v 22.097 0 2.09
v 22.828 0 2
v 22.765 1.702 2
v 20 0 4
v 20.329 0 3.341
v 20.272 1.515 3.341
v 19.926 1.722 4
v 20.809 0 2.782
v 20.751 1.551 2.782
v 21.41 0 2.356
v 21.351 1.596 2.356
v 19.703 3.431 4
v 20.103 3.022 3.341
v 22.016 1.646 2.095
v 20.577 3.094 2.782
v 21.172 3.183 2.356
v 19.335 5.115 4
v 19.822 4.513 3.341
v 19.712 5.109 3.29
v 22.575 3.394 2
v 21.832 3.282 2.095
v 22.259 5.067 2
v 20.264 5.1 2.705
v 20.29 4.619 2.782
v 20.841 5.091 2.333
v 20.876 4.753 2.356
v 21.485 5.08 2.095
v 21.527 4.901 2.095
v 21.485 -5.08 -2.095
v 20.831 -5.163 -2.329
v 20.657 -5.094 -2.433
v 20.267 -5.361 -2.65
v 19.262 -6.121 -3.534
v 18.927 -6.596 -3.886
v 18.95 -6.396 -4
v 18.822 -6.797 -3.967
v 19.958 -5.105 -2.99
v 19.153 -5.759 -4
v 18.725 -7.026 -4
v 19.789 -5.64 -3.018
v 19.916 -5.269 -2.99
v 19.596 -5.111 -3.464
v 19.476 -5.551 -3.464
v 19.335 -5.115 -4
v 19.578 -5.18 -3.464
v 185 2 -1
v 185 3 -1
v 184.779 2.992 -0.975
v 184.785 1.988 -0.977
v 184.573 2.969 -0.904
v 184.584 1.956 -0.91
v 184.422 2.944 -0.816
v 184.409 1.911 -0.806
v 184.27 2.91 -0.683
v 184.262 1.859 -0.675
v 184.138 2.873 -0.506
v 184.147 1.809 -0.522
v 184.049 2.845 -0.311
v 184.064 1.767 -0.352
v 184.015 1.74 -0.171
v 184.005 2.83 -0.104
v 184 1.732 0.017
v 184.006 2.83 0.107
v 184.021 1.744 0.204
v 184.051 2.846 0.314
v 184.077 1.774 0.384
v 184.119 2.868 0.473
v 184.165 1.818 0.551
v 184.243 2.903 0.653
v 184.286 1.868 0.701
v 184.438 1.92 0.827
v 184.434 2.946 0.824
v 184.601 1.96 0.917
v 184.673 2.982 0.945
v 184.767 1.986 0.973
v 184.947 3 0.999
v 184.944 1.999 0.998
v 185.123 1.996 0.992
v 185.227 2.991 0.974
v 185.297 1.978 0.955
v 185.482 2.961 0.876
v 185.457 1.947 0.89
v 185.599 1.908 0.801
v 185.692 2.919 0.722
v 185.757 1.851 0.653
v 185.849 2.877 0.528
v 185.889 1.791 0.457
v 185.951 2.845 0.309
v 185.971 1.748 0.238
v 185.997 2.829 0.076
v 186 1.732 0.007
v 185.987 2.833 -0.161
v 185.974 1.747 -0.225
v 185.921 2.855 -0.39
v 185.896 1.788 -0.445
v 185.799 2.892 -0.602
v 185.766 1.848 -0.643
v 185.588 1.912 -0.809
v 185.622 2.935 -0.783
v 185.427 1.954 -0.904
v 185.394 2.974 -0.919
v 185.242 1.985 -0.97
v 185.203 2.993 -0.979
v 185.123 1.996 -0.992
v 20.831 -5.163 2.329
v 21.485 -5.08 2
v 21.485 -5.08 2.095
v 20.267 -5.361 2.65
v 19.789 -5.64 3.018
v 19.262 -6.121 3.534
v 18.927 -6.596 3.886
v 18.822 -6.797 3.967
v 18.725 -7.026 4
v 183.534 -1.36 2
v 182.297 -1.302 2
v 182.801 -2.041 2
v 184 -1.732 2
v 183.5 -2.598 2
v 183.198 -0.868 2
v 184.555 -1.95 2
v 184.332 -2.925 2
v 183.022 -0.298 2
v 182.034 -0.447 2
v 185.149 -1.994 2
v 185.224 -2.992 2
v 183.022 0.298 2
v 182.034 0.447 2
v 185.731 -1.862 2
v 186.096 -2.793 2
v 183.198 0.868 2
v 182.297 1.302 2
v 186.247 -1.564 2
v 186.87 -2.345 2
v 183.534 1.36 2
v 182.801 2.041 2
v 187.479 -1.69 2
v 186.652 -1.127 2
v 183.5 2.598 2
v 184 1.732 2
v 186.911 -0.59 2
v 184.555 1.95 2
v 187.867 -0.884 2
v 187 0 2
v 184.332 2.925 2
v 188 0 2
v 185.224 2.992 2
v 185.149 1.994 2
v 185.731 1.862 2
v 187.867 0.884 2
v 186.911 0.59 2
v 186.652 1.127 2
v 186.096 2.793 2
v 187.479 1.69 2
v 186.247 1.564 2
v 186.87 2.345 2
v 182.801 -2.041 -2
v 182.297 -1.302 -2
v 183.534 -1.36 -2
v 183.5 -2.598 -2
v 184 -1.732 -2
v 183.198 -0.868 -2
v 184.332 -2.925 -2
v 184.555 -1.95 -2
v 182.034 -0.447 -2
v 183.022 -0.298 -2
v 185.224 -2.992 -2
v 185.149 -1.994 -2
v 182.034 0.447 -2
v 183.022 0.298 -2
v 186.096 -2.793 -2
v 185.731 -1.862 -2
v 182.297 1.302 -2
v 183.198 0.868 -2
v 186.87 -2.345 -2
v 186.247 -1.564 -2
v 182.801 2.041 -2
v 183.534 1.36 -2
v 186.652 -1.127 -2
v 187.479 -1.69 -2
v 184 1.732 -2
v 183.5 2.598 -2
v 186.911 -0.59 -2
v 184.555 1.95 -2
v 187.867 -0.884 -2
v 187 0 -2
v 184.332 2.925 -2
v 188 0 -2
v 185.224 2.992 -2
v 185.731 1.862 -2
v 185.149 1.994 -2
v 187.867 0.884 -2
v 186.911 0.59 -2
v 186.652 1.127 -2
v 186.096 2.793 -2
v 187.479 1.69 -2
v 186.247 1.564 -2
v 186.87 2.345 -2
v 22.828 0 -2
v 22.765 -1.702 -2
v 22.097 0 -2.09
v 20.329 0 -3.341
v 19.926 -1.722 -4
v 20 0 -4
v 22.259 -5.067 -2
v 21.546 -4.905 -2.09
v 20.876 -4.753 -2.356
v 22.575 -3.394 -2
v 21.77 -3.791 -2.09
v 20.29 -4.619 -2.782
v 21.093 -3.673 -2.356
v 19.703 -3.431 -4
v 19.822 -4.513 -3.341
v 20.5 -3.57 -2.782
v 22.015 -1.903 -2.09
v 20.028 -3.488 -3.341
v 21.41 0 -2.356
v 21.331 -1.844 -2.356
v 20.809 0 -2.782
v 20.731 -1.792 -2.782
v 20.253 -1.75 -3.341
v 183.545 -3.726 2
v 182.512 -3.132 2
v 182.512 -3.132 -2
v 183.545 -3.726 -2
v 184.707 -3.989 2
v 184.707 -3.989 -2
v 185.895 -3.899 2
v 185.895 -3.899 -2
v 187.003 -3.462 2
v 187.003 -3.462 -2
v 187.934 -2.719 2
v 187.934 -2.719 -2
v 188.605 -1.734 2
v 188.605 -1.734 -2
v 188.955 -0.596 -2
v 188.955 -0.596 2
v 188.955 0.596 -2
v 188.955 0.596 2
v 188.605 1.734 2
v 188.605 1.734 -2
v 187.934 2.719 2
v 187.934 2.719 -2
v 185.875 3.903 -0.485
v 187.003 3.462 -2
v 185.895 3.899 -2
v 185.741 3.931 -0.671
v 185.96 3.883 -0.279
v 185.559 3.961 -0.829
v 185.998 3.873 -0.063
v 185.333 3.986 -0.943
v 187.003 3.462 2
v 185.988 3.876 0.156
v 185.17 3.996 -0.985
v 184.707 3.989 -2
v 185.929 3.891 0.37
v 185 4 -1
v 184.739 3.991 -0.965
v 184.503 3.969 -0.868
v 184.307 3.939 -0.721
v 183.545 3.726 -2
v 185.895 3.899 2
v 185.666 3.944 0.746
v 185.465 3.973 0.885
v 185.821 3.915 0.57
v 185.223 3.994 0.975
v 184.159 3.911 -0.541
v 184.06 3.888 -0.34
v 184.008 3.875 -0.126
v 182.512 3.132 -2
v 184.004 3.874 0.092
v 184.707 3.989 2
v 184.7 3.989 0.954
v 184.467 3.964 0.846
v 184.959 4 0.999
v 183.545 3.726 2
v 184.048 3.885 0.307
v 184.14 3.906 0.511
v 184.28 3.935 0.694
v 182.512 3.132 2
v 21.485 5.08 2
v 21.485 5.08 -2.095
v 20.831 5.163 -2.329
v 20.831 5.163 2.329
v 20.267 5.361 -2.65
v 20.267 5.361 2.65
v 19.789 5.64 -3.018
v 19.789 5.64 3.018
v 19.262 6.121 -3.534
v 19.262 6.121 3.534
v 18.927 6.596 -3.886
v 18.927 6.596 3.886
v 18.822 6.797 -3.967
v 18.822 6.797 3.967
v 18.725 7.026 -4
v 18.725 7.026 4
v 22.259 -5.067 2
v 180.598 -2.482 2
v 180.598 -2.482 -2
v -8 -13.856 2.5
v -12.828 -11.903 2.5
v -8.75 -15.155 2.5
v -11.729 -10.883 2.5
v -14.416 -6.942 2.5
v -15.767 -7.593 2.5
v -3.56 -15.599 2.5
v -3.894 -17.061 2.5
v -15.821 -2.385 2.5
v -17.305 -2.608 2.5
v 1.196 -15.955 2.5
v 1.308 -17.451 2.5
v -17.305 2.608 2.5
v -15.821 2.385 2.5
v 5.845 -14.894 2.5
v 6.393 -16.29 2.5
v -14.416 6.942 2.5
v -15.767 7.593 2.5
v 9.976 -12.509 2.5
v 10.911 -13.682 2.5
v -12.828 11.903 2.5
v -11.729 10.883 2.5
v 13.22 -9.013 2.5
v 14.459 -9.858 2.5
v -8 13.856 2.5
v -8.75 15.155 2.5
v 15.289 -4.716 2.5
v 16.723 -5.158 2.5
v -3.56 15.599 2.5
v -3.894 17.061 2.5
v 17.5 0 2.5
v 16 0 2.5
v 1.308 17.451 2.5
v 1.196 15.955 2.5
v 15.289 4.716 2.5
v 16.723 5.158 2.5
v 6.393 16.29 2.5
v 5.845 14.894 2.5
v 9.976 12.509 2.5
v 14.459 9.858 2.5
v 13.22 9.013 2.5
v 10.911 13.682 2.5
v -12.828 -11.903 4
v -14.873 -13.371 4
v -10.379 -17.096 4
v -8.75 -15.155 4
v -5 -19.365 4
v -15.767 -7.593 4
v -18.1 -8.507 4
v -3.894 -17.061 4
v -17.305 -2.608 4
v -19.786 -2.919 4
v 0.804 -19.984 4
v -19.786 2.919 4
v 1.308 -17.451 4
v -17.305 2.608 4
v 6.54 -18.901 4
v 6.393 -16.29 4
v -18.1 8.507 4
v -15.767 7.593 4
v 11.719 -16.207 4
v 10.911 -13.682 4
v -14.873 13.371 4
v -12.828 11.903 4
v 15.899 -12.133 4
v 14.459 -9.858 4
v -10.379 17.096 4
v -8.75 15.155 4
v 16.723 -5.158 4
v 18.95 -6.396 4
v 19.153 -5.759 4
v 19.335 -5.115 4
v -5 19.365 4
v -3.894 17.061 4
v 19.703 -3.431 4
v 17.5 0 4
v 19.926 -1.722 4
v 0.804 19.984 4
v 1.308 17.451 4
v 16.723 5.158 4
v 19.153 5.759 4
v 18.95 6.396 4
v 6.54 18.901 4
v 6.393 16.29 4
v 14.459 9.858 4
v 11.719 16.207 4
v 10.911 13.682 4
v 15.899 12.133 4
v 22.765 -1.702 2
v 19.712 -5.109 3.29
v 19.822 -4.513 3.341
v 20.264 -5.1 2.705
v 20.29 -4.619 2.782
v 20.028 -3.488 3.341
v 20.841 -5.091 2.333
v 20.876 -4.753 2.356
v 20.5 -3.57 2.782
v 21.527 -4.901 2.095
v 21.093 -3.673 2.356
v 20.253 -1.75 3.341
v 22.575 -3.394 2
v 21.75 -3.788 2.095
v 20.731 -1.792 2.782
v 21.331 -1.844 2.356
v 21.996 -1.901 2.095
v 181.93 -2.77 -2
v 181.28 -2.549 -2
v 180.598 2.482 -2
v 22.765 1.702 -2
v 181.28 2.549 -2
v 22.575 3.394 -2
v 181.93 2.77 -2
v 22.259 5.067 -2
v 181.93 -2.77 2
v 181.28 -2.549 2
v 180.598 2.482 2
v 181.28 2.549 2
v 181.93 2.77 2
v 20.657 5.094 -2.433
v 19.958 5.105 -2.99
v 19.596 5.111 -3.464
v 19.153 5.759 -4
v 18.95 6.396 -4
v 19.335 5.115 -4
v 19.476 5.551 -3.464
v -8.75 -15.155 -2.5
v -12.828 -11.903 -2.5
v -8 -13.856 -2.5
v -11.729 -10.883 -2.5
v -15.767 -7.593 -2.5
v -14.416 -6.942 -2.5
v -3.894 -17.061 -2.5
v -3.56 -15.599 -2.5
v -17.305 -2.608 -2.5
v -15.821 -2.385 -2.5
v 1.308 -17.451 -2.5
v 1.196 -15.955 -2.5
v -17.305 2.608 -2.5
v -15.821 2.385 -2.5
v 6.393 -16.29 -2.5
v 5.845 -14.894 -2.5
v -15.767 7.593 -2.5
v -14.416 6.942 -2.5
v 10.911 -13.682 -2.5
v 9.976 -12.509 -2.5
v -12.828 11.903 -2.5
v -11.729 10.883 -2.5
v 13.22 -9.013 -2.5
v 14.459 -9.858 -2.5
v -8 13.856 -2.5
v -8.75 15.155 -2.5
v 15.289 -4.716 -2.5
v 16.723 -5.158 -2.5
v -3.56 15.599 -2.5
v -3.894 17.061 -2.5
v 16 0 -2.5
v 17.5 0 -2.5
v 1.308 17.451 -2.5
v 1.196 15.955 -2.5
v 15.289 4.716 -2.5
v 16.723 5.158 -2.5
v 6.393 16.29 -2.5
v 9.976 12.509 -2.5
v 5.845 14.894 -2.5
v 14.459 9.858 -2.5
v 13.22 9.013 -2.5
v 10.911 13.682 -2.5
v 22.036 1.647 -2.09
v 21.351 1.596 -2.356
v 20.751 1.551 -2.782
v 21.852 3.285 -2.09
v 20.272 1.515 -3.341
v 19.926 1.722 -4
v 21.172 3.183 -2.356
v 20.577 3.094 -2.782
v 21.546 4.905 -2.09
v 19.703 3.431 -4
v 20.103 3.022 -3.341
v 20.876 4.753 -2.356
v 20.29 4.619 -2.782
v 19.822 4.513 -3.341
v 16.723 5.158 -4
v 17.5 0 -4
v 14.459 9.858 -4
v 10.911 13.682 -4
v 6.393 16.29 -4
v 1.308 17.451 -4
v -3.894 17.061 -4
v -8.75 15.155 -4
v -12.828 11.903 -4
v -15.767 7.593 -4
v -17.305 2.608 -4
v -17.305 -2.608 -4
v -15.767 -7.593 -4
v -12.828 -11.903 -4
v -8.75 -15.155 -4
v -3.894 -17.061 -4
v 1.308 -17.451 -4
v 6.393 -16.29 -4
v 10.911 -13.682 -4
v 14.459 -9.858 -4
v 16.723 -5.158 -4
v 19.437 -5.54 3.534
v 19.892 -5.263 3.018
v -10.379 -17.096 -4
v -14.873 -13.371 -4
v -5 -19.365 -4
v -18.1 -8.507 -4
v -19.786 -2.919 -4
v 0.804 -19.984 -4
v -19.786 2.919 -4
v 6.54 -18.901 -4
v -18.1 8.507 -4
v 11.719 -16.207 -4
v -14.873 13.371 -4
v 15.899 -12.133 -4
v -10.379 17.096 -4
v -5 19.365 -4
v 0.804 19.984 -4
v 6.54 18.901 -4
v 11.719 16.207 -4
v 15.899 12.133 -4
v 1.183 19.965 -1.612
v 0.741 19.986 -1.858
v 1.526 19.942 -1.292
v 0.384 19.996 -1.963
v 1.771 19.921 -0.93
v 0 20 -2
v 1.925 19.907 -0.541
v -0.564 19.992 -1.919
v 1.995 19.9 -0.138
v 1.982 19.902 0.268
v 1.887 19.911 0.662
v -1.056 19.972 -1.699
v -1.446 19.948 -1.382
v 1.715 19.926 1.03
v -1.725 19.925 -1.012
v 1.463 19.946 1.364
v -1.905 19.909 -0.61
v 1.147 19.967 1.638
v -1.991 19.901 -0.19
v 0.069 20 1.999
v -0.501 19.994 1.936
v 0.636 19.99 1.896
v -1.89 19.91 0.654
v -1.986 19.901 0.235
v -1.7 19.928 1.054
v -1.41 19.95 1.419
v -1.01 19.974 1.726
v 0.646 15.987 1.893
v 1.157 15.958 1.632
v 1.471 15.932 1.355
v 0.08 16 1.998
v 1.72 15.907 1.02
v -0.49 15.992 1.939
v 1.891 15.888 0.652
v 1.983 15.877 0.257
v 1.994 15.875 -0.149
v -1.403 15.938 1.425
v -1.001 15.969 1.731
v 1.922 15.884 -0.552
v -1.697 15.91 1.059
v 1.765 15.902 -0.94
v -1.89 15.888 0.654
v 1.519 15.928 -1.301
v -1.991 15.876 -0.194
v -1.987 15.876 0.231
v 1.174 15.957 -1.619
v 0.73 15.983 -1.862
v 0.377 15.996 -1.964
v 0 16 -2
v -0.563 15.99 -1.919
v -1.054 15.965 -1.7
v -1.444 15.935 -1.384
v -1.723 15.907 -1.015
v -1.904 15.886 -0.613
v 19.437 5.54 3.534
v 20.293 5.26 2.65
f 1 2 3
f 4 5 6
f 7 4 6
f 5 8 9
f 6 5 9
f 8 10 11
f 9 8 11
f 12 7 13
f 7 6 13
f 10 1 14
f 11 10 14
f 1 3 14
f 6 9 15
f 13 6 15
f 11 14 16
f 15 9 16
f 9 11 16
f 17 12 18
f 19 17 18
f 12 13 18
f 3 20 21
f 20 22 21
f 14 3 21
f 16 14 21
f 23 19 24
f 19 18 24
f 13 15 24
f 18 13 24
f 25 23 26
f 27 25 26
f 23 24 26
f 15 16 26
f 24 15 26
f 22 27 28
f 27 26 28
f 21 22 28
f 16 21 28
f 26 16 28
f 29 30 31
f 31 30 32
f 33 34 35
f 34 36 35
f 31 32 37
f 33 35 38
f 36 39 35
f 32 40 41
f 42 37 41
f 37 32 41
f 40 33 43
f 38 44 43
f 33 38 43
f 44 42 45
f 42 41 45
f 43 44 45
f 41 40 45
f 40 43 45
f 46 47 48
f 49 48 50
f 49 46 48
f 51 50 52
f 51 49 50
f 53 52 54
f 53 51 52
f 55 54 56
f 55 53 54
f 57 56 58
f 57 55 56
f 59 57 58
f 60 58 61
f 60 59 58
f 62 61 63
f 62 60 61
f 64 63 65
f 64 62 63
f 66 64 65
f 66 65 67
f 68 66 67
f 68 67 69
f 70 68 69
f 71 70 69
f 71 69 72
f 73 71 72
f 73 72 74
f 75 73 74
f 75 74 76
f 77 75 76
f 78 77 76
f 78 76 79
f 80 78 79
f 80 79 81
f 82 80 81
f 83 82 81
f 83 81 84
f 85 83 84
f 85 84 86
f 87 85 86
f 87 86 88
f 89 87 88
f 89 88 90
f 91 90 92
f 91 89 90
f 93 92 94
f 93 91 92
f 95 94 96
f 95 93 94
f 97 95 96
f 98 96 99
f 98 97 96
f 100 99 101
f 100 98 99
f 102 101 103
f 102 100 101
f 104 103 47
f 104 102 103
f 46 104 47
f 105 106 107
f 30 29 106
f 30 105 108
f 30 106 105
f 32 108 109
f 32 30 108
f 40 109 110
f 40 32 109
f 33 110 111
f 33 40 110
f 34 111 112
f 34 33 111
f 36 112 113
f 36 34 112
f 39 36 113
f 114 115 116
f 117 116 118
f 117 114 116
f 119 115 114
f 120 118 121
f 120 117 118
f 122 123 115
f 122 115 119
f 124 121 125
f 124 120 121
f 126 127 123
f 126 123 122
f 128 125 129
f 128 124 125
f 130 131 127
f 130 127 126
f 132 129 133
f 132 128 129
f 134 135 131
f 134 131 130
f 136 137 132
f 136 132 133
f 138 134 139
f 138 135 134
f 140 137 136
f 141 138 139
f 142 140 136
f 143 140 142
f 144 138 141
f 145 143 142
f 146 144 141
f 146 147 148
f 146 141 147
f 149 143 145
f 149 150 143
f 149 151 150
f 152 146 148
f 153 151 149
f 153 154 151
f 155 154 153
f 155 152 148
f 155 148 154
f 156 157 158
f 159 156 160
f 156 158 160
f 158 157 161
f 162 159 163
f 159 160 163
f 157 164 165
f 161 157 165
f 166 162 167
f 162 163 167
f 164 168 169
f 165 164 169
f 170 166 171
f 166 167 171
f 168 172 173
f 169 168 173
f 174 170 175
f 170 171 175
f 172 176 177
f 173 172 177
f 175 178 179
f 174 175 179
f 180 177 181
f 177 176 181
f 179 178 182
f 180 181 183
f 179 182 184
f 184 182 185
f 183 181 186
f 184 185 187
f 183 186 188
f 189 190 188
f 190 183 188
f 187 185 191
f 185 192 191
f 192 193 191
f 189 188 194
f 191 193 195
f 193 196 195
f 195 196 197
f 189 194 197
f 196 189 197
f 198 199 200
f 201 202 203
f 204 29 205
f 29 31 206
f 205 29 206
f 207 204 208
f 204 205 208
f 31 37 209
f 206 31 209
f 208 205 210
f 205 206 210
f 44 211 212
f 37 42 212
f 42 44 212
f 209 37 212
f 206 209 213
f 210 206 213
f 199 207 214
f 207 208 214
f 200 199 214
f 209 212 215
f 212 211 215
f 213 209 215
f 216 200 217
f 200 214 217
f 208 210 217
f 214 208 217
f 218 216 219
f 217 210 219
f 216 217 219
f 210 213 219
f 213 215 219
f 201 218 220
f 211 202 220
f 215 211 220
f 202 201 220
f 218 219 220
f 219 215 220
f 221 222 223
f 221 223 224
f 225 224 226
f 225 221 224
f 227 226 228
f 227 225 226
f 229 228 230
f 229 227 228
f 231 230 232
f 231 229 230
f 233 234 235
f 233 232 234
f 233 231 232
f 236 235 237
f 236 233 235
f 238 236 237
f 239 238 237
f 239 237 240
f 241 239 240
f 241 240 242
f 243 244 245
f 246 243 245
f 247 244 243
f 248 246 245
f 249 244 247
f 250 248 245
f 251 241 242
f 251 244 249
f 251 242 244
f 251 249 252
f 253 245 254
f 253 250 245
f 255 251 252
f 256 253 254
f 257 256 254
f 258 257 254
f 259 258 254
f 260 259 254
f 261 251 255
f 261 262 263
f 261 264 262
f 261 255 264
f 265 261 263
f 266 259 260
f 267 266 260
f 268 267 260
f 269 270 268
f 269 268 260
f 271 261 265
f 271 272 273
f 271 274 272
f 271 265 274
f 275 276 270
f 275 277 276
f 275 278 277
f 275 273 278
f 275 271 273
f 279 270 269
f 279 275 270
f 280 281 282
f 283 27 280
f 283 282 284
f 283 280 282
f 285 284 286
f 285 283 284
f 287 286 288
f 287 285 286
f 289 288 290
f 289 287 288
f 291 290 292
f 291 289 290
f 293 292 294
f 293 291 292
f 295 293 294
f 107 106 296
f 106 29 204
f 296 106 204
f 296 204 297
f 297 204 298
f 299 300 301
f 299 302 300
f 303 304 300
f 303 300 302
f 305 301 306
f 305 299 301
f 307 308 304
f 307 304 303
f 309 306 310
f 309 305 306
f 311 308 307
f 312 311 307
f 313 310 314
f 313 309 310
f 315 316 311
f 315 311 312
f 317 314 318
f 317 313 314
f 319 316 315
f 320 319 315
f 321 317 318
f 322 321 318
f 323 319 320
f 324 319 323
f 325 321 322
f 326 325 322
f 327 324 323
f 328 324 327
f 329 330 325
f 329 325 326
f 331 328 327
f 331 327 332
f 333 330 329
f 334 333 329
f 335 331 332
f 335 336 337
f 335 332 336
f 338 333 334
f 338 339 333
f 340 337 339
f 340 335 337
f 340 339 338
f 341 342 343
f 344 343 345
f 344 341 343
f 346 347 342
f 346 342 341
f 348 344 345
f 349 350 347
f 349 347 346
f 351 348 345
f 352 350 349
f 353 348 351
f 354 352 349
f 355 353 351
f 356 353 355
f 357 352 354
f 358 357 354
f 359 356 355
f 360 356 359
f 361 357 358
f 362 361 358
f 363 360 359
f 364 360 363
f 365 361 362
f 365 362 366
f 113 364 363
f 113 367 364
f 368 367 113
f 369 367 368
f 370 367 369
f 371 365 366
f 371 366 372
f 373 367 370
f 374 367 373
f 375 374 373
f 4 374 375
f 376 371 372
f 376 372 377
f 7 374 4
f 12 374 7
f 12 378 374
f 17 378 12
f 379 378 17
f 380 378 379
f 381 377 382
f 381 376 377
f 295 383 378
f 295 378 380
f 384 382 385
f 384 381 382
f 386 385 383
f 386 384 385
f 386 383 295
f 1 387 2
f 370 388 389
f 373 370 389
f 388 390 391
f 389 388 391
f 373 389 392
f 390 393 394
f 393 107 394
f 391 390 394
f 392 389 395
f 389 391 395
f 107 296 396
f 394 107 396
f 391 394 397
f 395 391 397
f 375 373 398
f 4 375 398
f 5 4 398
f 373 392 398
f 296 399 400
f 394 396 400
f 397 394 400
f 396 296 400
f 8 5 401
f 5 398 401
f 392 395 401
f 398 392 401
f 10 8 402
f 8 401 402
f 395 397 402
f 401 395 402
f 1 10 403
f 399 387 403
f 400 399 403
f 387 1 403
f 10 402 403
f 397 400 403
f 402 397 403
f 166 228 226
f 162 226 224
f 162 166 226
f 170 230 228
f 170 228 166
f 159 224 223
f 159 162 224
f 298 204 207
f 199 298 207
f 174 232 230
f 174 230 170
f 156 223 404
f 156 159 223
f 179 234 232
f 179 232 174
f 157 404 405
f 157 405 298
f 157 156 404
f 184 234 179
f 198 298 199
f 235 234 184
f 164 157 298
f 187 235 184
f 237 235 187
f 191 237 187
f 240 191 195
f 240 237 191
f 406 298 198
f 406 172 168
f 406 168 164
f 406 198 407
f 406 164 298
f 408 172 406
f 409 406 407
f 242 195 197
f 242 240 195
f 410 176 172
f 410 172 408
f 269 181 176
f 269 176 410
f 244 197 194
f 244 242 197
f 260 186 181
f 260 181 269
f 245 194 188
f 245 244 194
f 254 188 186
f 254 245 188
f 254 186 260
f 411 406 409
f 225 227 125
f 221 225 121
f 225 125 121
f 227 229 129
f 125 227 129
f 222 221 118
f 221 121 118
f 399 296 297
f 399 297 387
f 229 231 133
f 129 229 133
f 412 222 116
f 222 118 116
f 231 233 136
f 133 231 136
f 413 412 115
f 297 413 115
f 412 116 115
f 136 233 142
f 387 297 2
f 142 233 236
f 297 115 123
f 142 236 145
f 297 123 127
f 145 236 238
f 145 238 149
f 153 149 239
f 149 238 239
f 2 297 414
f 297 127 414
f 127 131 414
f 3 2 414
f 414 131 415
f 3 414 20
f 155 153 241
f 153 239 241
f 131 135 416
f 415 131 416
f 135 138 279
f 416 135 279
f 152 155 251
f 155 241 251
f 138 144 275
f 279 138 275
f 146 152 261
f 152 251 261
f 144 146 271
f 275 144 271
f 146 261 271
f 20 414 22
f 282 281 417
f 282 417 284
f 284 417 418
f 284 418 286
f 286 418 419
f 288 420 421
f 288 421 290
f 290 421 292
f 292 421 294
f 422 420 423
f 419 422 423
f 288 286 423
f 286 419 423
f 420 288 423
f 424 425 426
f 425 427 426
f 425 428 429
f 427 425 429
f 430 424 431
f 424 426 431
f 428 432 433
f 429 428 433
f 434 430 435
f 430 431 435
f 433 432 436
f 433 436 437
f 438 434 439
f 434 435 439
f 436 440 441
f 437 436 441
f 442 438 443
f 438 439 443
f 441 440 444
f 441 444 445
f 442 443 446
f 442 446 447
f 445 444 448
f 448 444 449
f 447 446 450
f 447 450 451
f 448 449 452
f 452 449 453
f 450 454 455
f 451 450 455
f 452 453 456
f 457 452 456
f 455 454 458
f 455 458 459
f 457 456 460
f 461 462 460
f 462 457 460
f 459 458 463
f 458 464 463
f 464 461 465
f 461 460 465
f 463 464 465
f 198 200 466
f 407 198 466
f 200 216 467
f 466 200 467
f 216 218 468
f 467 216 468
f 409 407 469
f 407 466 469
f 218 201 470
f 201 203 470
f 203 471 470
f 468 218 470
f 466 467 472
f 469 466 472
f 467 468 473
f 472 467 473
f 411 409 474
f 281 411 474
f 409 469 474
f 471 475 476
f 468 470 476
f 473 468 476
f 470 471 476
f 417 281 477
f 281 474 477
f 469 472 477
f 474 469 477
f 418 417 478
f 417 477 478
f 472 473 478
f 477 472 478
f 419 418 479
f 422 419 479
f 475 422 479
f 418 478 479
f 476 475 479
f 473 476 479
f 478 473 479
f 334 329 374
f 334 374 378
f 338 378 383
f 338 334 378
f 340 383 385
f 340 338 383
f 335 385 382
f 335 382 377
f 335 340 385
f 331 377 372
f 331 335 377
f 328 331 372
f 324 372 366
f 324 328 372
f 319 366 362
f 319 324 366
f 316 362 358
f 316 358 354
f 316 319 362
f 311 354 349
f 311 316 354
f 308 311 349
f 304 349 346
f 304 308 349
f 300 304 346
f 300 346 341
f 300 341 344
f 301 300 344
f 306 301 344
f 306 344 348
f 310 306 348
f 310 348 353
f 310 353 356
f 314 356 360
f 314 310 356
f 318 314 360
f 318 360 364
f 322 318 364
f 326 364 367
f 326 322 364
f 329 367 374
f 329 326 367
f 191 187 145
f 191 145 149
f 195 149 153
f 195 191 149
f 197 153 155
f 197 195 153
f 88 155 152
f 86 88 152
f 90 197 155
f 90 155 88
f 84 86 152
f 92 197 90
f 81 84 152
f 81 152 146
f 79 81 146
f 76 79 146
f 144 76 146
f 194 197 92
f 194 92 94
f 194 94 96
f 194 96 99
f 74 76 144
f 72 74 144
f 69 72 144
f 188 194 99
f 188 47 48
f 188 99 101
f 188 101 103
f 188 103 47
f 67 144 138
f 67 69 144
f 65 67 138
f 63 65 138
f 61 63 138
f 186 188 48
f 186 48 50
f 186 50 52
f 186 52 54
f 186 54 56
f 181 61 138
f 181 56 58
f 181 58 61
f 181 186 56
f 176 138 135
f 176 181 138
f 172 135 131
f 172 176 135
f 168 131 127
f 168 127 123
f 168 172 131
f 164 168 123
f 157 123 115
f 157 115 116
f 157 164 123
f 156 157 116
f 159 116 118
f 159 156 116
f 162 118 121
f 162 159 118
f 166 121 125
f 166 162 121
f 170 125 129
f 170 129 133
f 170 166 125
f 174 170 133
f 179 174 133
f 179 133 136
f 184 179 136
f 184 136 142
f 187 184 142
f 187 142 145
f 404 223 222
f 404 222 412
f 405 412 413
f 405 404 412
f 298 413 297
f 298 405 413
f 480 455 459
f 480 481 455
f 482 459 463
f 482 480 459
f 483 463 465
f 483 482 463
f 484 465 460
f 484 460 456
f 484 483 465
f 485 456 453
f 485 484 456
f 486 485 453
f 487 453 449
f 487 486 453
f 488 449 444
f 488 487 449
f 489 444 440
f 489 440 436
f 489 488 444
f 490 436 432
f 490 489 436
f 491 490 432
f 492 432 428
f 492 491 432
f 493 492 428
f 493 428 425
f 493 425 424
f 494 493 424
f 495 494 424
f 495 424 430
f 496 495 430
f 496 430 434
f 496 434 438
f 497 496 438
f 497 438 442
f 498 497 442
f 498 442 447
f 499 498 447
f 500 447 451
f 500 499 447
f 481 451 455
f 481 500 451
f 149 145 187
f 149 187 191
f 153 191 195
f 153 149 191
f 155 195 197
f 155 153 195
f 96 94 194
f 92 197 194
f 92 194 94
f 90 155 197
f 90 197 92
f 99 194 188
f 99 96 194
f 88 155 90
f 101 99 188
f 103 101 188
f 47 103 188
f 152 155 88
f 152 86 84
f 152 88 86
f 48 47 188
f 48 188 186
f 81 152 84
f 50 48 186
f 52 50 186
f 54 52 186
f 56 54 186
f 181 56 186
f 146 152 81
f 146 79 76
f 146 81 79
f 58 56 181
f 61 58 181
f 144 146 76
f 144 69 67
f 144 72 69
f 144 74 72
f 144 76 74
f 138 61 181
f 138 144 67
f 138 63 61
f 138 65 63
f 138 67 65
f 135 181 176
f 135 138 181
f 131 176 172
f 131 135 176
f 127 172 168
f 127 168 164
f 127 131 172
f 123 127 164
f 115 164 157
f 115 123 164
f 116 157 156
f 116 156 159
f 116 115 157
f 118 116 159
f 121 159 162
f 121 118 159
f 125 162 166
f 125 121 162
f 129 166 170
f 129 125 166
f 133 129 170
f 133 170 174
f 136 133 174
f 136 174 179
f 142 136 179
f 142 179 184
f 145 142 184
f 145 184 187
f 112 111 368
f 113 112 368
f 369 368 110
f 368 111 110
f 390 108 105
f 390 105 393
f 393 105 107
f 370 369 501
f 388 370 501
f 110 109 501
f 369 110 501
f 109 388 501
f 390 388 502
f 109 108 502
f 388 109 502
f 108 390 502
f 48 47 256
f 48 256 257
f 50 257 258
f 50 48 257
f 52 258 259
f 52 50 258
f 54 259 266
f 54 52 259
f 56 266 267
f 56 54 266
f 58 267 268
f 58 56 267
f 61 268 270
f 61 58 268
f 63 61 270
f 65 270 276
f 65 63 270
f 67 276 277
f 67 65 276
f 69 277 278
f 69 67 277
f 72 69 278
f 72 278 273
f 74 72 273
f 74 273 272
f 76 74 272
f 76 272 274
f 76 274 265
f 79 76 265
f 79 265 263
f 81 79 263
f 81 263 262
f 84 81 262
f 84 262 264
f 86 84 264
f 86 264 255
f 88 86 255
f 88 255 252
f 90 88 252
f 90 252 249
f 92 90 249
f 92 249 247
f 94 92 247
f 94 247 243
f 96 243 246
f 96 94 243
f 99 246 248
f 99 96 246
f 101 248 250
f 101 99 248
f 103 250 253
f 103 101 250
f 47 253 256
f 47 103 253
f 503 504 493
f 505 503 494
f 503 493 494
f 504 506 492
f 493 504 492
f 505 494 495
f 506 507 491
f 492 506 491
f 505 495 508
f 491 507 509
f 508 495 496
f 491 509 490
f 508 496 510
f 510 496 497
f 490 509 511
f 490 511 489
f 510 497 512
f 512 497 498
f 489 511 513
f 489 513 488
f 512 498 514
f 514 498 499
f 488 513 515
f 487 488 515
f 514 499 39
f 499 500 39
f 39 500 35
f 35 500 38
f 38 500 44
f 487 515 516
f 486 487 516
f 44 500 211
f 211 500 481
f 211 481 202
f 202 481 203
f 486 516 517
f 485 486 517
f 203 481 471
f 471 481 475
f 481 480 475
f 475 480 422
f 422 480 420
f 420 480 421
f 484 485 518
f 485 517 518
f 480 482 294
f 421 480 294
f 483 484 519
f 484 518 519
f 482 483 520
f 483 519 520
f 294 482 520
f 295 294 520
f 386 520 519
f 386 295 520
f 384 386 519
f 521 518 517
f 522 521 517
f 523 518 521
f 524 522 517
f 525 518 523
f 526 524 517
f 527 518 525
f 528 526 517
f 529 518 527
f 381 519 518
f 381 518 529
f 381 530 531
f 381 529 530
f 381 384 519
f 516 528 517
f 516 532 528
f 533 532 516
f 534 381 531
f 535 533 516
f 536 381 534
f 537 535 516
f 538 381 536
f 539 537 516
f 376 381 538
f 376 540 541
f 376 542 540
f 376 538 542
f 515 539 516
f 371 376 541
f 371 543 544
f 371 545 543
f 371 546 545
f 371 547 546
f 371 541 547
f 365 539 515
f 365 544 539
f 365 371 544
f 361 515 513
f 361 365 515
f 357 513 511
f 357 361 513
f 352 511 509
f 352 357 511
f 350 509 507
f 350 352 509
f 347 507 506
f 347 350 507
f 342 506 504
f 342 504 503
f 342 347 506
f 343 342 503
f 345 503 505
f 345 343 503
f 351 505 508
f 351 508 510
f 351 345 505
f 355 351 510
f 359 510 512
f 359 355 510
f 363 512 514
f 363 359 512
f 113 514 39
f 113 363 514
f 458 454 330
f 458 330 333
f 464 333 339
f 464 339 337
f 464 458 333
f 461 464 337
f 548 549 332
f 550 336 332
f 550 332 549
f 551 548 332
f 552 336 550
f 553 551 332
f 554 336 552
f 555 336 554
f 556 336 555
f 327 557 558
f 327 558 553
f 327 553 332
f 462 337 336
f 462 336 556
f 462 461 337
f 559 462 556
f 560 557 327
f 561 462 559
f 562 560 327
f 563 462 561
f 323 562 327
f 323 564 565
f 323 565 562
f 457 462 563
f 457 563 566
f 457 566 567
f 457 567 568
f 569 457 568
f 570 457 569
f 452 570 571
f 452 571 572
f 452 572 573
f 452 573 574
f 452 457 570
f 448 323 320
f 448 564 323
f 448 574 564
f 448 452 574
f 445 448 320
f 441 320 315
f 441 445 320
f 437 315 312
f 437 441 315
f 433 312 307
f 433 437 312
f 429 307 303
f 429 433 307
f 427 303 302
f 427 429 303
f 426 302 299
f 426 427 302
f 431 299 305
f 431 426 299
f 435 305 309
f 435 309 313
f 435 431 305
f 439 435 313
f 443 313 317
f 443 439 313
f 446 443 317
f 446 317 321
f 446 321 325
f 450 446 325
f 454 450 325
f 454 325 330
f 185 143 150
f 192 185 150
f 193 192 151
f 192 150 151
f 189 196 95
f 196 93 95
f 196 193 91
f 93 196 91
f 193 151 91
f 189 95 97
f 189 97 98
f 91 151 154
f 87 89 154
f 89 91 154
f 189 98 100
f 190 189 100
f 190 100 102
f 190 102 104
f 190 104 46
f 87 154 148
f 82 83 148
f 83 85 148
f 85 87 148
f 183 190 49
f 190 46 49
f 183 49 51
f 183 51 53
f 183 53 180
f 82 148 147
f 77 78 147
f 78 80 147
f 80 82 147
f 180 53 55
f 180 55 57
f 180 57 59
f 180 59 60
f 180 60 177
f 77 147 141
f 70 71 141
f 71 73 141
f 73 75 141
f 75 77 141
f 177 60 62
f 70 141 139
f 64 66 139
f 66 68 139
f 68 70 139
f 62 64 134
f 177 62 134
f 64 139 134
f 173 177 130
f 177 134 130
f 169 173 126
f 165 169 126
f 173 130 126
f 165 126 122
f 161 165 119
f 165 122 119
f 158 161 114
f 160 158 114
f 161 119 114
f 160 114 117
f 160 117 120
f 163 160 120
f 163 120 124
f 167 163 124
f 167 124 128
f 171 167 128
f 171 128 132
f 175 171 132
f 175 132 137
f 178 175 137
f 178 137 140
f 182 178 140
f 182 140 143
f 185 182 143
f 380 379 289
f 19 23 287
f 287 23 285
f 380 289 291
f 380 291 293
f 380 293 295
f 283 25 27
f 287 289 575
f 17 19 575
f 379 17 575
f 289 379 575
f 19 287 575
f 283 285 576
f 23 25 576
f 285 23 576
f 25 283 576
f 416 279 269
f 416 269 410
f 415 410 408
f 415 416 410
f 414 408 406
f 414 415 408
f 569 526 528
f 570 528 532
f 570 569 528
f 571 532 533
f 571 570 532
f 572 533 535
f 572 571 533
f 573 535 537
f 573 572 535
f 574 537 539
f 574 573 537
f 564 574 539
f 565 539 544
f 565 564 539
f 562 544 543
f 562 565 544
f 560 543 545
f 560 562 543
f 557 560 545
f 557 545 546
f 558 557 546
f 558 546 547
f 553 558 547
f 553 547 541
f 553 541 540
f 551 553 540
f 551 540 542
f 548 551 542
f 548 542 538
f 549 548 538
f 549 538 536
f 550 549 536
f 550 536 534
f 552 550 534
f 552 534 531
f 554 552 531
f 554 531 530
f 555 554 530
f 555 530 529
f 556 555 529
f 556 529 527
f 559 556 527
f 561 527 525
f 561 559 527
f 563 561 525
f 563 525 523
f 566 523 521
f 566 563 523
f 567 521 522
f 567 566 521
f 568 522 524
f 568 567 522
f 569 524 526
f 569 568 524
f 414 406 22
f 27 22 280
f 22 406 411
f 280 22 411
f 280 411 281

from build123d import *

# Parameters (mm, degrees)
SKETCH1_R           = 20
SKETCH1_R_2         = 17.5
BOSS_EXTRUDE1_DEPTH = 4
SKETCH2_R           = 4
SKETCH2_R_2         = 3
BOSS_EXTRUDE2_DEPTH = 2
BOSS_EXTRUDE3_DEPTH = 2
FILLET2_R           = 3
SKETCH4_R           = 17.5
SKETCH4_R_2         = 16
BOSS_EXTRUDE4_DEPTH = 2.5
SKETCH5_R           = 3
SKETCH5_R_2         = 2
BOSS_EXTRUDE5_DEPTH = 4
SKETCH6_R           = 2
SKETCH6_R_2         = 1
CUT_EXTRUDE1_DEPTH  = 191.097343487


with BuildPart() as part:
    # Sketch1 → Boss-Extrude1 (new, symmetric)
    with BuildSketch(Plane.XY):
        Circle(SKETCH1_R)
        Circle(SKETCH1_R_2, mode=Mode.SUBTRACT)
    extrude(amount=BOSS_EXTRUDE1_DEPTH, both=True)



with BuildPart() as body_2:
    # Sketch2 → Boss-Extrude2 (new, symmetric)
    with BuildSketch(Plane.XY):
        with Locations((185, 0)):
            Circle(SKETCH2_R)
        with Locations((185, 0)):
            Circle(SKETCH2_R_2, mode=Mode.SUBTRACT)
    extrude(amount=BOSS_EXTRUDE2_DEPTH, both=True)


with BuildPart() as part_1:
    add(part.part)

    add(body_2.part)  # Boss-Extrude3 merges body 2
    # Sketch3 → Boss-Extrude3 (add, symmetric)
    with BuildSketch(Plane.XY):
        with BuildLine():
            Line((19.334803677, 5.115209357), (181.847093747, 2.461540607))
            ThreePointArc((181.847093747, 2.461540607), (181, 0), (181.847093747, -2.461540607))
            Line((181.847093747, -2.461540607), (19.334803677, -5.115209357))
            ThreePointArc((19.334803677, -5.115209357), (20, 0), (19.334803677, 5.115209357))
        make_face()
    extrude(amount=BOSS_EXTRUDE3_DEPTH, both=True)

    # Fillet2
    # the kernel refuses this fillet: 3 mm, written as the material it adds along each edge
    with BuildSketch(Plane(origin=(0, 0, -2), x_dir=(1, 0, 0), z_dir=(0, -1, 0))) as fillet2_piece_1_section:
        with BuildLine():
            CenterArc((22.828427125, -3), FILLET2_R, 90, 70.528779366)
            Line((22.828427125, 0), (22.828427125, 0.06))
            Line((22.828427125, 0.06), (20, 0.06))
            Line((20, 0.06), (19.94, 0))
            ThreePointArc((19.94, 0), (19.94, -1), (19.943431458, -1.98))
            Line((19.943431458, -1.98), (20, -2))
        make_face()
    fillet2_piece_1 = revolve(axis=Axis((0, 0, -2), (0, 0, 1)), revolution_arc=35.075988766, mode=Mode.PRIVATE)
    fillet2_piece_1 = split(fillet2_piece_1, bisect_by=Plane(origin=(20.50402636, 5.09611708, -2.514287823), z_dir=(-0.01632685771654534, -0.99986670797517, 0)), keep=Keep.TOP, mode=Mode.PRIVATE)
    add(fillet2_piece_1)
    with BuildSketch(Plane(origin=(19.334803677, 5.115209357, 2), x_dir=(0.99986670797517, -0.01632685771654477, 0), z_dir=(0, 0, -1))) as fillet2_piece_2:
        with BuildLine():
            CenterArc((2.150626595, -3), FILLET2_R, 90, 68.498190281)
            Line((-0.640591379, -1.900408157), (-0.696415739, -1.87841632))
            ThreePointArc((-0.696415739, -1.87841632), (-0.353317386, -0.939073094), (-0.057746134, 0.016290612))
            Line((-0.057746134, 0.016290612), (0, 0.06))
            Line((0, 0.06), (2.150626595, 0.06))
            Line((2.150626595, 0.06), (2.150626595, 0))
        make_face()
    extrude(amount=4)
    with BuildSketch(Plane(origin=(19.334803677, -5.115209357, -2), x_dir=(-0.3039080161751765, -0.9527013790818551, 0), z_dir=(0, 0, 1))) as fillet2_piece_3:
        with BuildLine():
            CenterArc((2.155879863, 2.996227088), FILLET2_R, 198.627981215, 68.498190281)
            Line((-0.686957722, 2.037960706), (-0.743814474, 2.018795378))
            Line((-0.743814474, 2.018795378), (-0.056856752, -0.019165328))
            Line((-0.056856752, -0.019165328), (0.003008204, -0.059924542))
            ThreePointArc((0.003008204, -0.059924542), (1.00273482, -0.034847255), (2.002461436, -0.059924542))
            Line((2.002461436, -0.059924542), (2.00546964, 0))
        make_face()
    extrude(amount=4)
    with BuildSketch(Plane(origin=(181.847093747, -2.461540607, -2), x_dir=(0.7041582236338697, -0.7100430945293342, 0), z_dir=(0, 0, 1)), Plane(origin=(181.847093747, 2.461540607, 2), x_dir=(0.7041582236338706, 0.7100430945293335, 0), z_dir=(0, 0, -1))) as fillet2_piece_4:
        with BuildLine():
            CenterArc((1.298948631, -2.97901003), FILLET2_R, 96.781666847, 39.392256485)
            Line((-0.865386796, -0.901595253), (-0.908673505, -0.860046958))
            Line((-0.908673505, -0.860046958), (-0.043286709, 0.041548296))
            Line((-0.043286709, 0.041548296), (0.007085174, 0.059580201))
            ThreePointArc((0.007085174, 0.059580201), (0.472344957, 0.032013374), (0.937604739, 0.059580201))
            Line((0.937604739, 0.059580201), (0.944689914, 0))
        make_face()
    extrude(amount=4)
    with BuildSketch(Plane(origin=(0, 0, 2), x_dir=(1, 0, 0), z_dir=(0, -1, 0))) as fillet2_piece_5_section:
        with BuildLine():
            CenterArc((22.828427125, 3), FILLET2_R, 199.471220634, 70.528779366)
            Line((22.828427125, 0), (22.828427125, -0.06))
            Line((22.828427125, -0.06), (20, -0.06))
            Line((20, -0.06), (19.94, 0))
            ThreePointArc((19.94, 0), (19.94, 1), (19.943431458, 1.98))
            Line((19.943431458, 1.98), (20, 2))
        make_face()
    fillet2_piece_5 = revolve(axis=Axis((0, 0, 2), (0, 0, 1)), revolution_arc=35.075988766, mode=Mode.PRIVATE)
    fillet2_piece_5 = split(fillet2_piece_5, bisect_by=Plane(origin=(20.50402636, 5.09611708, 2.514287823), z_dir=(-0.01632685771654534, -0.99986670797517, 0)), keep=Keep.TOP, mode=Mode.PRIVATE)
    add(fillet2_piece_5)
    with BuildSketch(Plane(origin=(0, 0, 2), x_dir=(0.8183906159507496, -0.574662335396842, 0), z_dir=(-0.574662335396842, -0.8183906159507496, 0))) as fillet2_piece_6_section:
        with BuildLine():
            CenterArc((22.828427125, 3), FILLET2_R, 199.471220634, 70.528779366)
            Line((22.828427125, 0), (22.828427125, -0.06))
            Line((22.828427125, -0.06), (20, -0.06))
            Line((20, -0.06), (19.94, 0))
            ThreePointArc((19.94, 0), (19.94, 1), (19.943431458, 1.98))
            Line((19.943431458, 1.98), (20, 2))
        make_face()
    fillet2_piece_6 = revolve(axis=Axis((0, 0, 2), (0, 0, 1)), revolution_arc=35.075988766, mode=Mode.PRIVATE)
    fillet2_piece_6 = split(fillet2_piece_6, bisect_by=Plane(origin=(20.504025944, -5.096117086, 2.514287966), z_dir=(-0.01632685771654534, 0.99986670797517, 0)), keep=Keep.TOP, mode=Mode.PRIVATE)
    add(fillet2_piece_6)
    with BuildSketch(Plane(origin=(0, 0, -2), x_dir=(0.8183906159507496, -0.574662335396842, 0), z_dir=(-0.574662335396842, -0.8183906159507496, 0))) as fillet2_piece_7_section:
        with BuildLine():
            CenterArc((22.828427125, -3), FILLET2_R, 90, 70.528779366)
            Line((22.828427125, 0), (22.828427125, 0.06))
            Line((22.828427125, 0.06), (20, 0.06))
            Line((20, 0.06), (19.94, 0))
            ThreePointArc((19.94, 0), (19.94, -1), (19.943431458, -1.98))
            Line((19.943431458, -1.98), (20, -2))
        make_face()
    fillet2_piece_7 = revolve(axis=Axis((0, 0, -2), (0, 0, 1)), revolution_arc=35.075988766, mode=Mode.PRIVATE)
    fillet2_piece_7 = split(fillet2_piece_7, bisect_by=Plane(origin=(20.504025944, -5.096117086, -2.514287966), z_dir=(-0.01632685771654534, 0.99986670797517, 0)), keep=Keep.TOP, mode=Mode.PRIVATE)
    add(fillet2_piece_7)
    with BuildSketch(Plane(origin=(19.334803677, 5.115209357, 2), x_dir=(0.99986670797517, -0.01632685771654477, 0), z_dir=(0, 0, -1))) as fillet2_piece_8a_section:
        with BuildLine():
            CenterArc((2.150626595, -3), FILLET2_R, 90, 68.498190281)
            Line((-0.640591379, -1.900408157), (-0.696415739, -1.87841632))
            ThreePointArc((-0.696415739, -1.87841632), (-0.353317386, -0.939073094), (-0.057746134, 0.016290612))
            Line((-0.057746134, 0.016290612), (0, 0.06))
            Line((0, 0.06), (2.150626595, 0.06))
            Line((2.150626595, 0.06), (2.150626595, 0))
        make_face()
    fillet2_piece_8a = extrude(amount=9.376566487, mode=Mode.PRIVATE)
    fillet2_piece_8a = split(fillet2_piece_8a, bisect_by=Plane(origin=(19.695390581, 5.526512095, -2), z_dir=(0, 0, -1)), keep=Keep.TOP, mode=Mode.PRIVATE)
    fillet2_piece_8a = split(fillet2_piece_8a, bisect_by=Plane(origin=(19.695390581, 5.526512095, -4), z_dir=(0, 0, 1)), keep=Keep.TOP, mode=Mode.PRIVATE)
    with BuildSketch(Plane(origin=(0, 0, -2), x_dir=(1, 0, 0), z_dir=(0, -1, 0))) as fillet2_piece_8b_section:
        with BuildLine():
            CenterArc((22.828427125, -3), FILLET2_R, 90, 70.528779366)
            Line((22.828427125, 0), (22.828427125, 0.06))
            Line((22.828427125, 0.06), (20, 0.06))
            Line((20, 0.06), (19.94, 0))
            ThreePointArc((19.94, 0), (19.94, -1), (19.943431458, -1.98))
            Line((19.943431458, -1.98), (20, -2))
        make_face()
    fillet2_piece_8b = revolve(axis=Axis((0, 0, -2), (0, 0, 1)), revolution_arc=35.075988766, mode=Mode.PRIVATE)
    fillet2_piece_8b = split(fillet2_piece_8b, bisect_by=Plane(origin=(18.660284546, 5.126223603, -2.498924184), z_dir=(0.01632685771654534, 0.99986670797517, 0)), keep=Keep.TOP, mode=Mode.PRIVATE)
    fillet2_piece_8 = fillet2_piece_8a & fillet2_piece_8b
    add(fillet2_piece_8)
    with BuildSketch(Plane(origin=(19.334803677, 5.115209357, 7.376566487), x_dir=(0.99986670797517, -0.016326857716544716, 0), z_dir=(0, 0, -1))) as fillet2_piece_9a_section:
        with BuildLine():
            CenterArc((2.150626595, -3), FILLET2_R, 90, 68.498190281)
            Line((-0.640591379, -1.900408157), (-0.696415739, -1.87841632))
            ThreePointArc((-0.696415739, -1.87841632), (-0.353317386, -0.939073094), (-0.057746134, 0.016290612))
            Line((-0.057746134, 0.016290612), (0, 0.06))
            Line((0, 0.06), (2.150626595, 0.06))
            Line((2.150626595, 0.06), (2.150626595, 0))
        make_face()
    fillet2_piece_9a = extrude(amount=9.376566487, mode=Mode.PRIVATE)
    fillet2_piece_9a = split(fillet2_piece_9a, bisect_by=Plane(origin=(19.695390581, 5.526512095, 2), z_dir=(0, 0, 1)), keep=Keep.TOP, mode=Mode.PRIVATE)
    fillet2_piece_9a = split(fillet2_piece_9a, bisect_by=Plane(origin=(19.695390581, 5.526512095, 4), z_dir=(0, 0, -1)), keep=Keep.TOP, mode=Mode.PRIVATE)
    with BuildSketch(Plane(origin=(0, 0, 2), x_dir=(1, 0, 0), z_dir=(0, -1, 0))) as fillet2_piece_9b_section:
        with BuildLine():
            CenterArc((22.828427125, 3), FILLET2_R, 199.471220634, 70.528779366)
            Line((22.828427125, 0), (22.828427125, -0.06))
            Line((22.828427125, -0.06), (20, -0.06))
            Line((20, -0.06), (19.94, 0))
            ThreePointArc((19.94, 0), (19.94, 1), (19.943431458, 1.98))
            Line((19.943431458, 1.98), (20, 2))
        make_face()
    fillet2_piece_9b = revolve(axis=Axis((0, 0, 2), (0, 0, 1)), revolution_arc=35.075988766, mode=Mode.PRIVATE)
    fillet2_piece_9b = split(fillet2_piece_9b, bisect_by=Plane(origin=(18.660284546, 5.126223603, 2.498924184), z_dir=(0.01632685771654534, 0.99986670797517, 0)), keep=Keep.TOP, mode=Mode.PRIVATE)
    fillet2_piece_9 = fillet2_piece_9a & fillet2_piece_9b
    add(fillet2_piece_9)
    with BuildSketch(Plane(origin=(19.334803677, -5.115209357, -7.376566487), x_dir=(-0.303908016175173, -0.9527013790818563, 0), z_dir=(0, 0, 1))) as fillet2_piece_10a_section:
        with BuildLine():
            CenterArc((2.155879863, 2.996227088), FILLET2_R, 198.627981215, 68.498190281)
            Line((-0.686957722, 2.037960706), (-0.743814474, 2.018795378))
            Line((-0.743814474, 2.018795378), (-0.056856752, -0.019165328))
            Line((-0.056856752, -0.019165328), (0.003008204, -0.059924542))
            ThreePointArc((0.003008204, -0.059924542), (1.00273482, -0.034847255), (2.002461436, -0.059924542))
            Line((2.002461436, -0.059924542), (2.00546964, 0))
        make_face()
    fillet2_piece_10a = extrude(amount=9.376566487, mode=Mode.PRIVATE)
    fillet2_piece_10a = split(fillet2_piece_10a, bisect_by=Plane(origin=(19.695390581, -5.526512095, -4), z_dir=(0, 0, 1)), keep=Keep.TOP, mode=Mode.PRIVATE)
    fillet2_piece_10a = split(fillet2_piece_10a, bisect_by=Plane(origin=(19.695390581, -5.526512095, -2), z_dir=(0, 0, -1)), keep=Keep.TOP, mode=Mode.PRIVATE)
    with BuildSketch(Plane(origin=(0, 0, -2), x_dir=(0.8183906159507496, -0.574662335396842, 0), z_dir=(-0.574662335396842, -0.8183906159507496, 0))) as fillet2_piece_10b_section:
        with BuildLine():
            CenterArc((22.828427125, -3), FILLET2_R, 90, 70.528779366)
            Line((22.828427125, 0), (22.828427125, 0.06))
            Line((22.828427125, 0.06), (20, 0.06))
            Line((20, 0.06), (19.94, 0))
            ThreePointArc((19.94, 0), (19.94, -1), (19.943431458, -1.98))
            Line((19.943431458, -1.98), (20, -2))
        make_face()
    fillet2_piece_10b = revolve(axis=Axis((0, 0, -2), (0, 0, 1)), revolution_arc=35.075988766, mode=Mode.PRIVATE)
    fillet2_piece_10b = split(fillet2_piece_10b, bisect_by=Plane(origin=(18.660284792, -5.126223599, -2.498924133), z_dir=(0.01632685771654534, -0.99986670797517, 0)), keep=Keep.TOP, mode=Mode.PRIVATE)
    fillet2_piece_10 = fillet2_piece_10a & fillet2_piece_10b
    add(fillet2_piece_10)
    with BuildSketch(Plane(origin=(0, 0, 2), x_dir=(0.8183906159507496, -0.574662335396842, 0), z_dir=(-0.574662335396842, -0.8183906159507496, 0))) as fillet2_piece_11a_section:
        with BuildLine():
            CenterArc((22.828427125, 3), FILLET2_R, 199.471220634, 70.528779366)
            Line((22.828427125, 0), (22.828427125, -0.06))
            Line((22.828427125, -0.06), (20, -0.06))
            Line((20, -0.06), (19.94, 0))
            ThreePointArc((19.94, 0), (19.94, 1), (19.943431458, 1.98))
            Line((19.943431458, 1.98), (20, 2))
        make_face()
    fillet2_piece_11a = revolve(axis=Axis((0, 0, 2), (0, 0, 1)), revolution_arc=35.075988766, mode=Mode.PRIVATE)
    fillet2_piece_11a = split(fillet2_piece_11a, bisect_by=Plane(origin=(18.660284792, -5.126223599, 2.498924133), z_dir=(0.01632685771654534, -0.99986670797517, 0)), keep=Keep.TOP, mode=Mode.PRIVATE)
    with BuildSketch(Plane(origin=(19.334803677, -5.115209357, -2), x_dir=(-0.3039080161751765, -0.9527013790818551, 0), z_dir=(0, 0, 1))) as fillet2_piece_11b_section:
        with BuildLine():
            CenterArc((2.155879863, 2.996227088), FILLET2_R, 198.627981215, 68.498190281)
            Line((-0.686957722, 2.037960706), (-0.743814474, 2.018795378))
            Line((-0.743814474, 2.018795378), (-0.056856752, -0.019165328))
            Line((-0.056856752, -0.019165328), (0.003008204, -0.059924542))
            ThreePointArc((0.003008204, -0.059924542), (1.00273482, -0.034847255), (2.002461436, -0.059924542))
            Line((2.002461436, -0.059924542), (2.00546964, 0))
        make_face()
    fillet2_piece_11b = extrude(amount=9.376566487, mode=Mode.PRIVATE)
    fillet2_piece_11b = split(fillet2_piece_11b, bisect_by=Plane(origin=(19.695390581, -5.526512095, 4), z_dir=(0, 0, -1)), keep=Keep.TOP, mode=Mode.PRIVATE)
    fillet2_piece_11b = split(fillet2_piece_11b, bisect_by=Plane(origin=(19.695390581, -5.526512095, 2), z_dir=(0, 0, 1)), keep=Keep.TOP, mode=Mode.PRIVATE)
    fillet2_piece_11 = fillet2_piece_11a & fillet2_piece_11b
    add(fillet2_piece_11)

    # Sketch4 → Boss-Extrude4 (add, symmetric)
    with BuildSketch(Plane.XY):
        Circle(SKETCH4_R)
        Circle(SKETCH4_R_2, mode=Mode.SUBTRACT)
    extrude(amount=BOSS_EXTRUDE4_DEPTH, both=True)


with BuildPart() as body_2_2:
    # Sketch5 → Boss-Extrude5 (new body)
    with BuildSketch(Plane.XY.offset(2)):
        with Locations((185, 0)):
            Circle(SKETCH5_R)
        with Locations((185, 0)):
            Circle(SKETCH5_R_2, mode=Mode.SUBTRACT)
    extrude(amount=-BOSS_EXTRUDE5_DEPTH)


with BuildPart() as cut_extrude1_tool:
    # Sketch6 → Cut-Extrude1 (new, through all)
    with BuildSketch(Plane(origin=(0, 0, 0), x_dir=(1, 0, 0), z_dir=(0, 1, 0))):
        with Locations(Location((0, 0, 0), (0, 0, 90))):
            Circle(SKETCH6_R)
        with Locations(Location((185, 0, 0), (0, 0, 90))):
            Circle(SKETCH6_R_2)
    extrude(amount=CUT_EXTRUDE1_DEPTH)


with BuildPart() as part_2:
    add(part_1.part)

    # Cut-Extrude1: cut by cut_extrude1_tool
    add(cut_extrude1_tool.part, mode=Mode.SUBTRACT)


with BuildPart() as body_2_2_1:
    add(body_2_2.part)

    # Cut-Extrude1: cut by cut_extrude1_tool
    add(cut_extrude1_tool.part, mode=Mode.SUBTRACT)


solid = Compound([part_2.part, body_2_2_1.part])
